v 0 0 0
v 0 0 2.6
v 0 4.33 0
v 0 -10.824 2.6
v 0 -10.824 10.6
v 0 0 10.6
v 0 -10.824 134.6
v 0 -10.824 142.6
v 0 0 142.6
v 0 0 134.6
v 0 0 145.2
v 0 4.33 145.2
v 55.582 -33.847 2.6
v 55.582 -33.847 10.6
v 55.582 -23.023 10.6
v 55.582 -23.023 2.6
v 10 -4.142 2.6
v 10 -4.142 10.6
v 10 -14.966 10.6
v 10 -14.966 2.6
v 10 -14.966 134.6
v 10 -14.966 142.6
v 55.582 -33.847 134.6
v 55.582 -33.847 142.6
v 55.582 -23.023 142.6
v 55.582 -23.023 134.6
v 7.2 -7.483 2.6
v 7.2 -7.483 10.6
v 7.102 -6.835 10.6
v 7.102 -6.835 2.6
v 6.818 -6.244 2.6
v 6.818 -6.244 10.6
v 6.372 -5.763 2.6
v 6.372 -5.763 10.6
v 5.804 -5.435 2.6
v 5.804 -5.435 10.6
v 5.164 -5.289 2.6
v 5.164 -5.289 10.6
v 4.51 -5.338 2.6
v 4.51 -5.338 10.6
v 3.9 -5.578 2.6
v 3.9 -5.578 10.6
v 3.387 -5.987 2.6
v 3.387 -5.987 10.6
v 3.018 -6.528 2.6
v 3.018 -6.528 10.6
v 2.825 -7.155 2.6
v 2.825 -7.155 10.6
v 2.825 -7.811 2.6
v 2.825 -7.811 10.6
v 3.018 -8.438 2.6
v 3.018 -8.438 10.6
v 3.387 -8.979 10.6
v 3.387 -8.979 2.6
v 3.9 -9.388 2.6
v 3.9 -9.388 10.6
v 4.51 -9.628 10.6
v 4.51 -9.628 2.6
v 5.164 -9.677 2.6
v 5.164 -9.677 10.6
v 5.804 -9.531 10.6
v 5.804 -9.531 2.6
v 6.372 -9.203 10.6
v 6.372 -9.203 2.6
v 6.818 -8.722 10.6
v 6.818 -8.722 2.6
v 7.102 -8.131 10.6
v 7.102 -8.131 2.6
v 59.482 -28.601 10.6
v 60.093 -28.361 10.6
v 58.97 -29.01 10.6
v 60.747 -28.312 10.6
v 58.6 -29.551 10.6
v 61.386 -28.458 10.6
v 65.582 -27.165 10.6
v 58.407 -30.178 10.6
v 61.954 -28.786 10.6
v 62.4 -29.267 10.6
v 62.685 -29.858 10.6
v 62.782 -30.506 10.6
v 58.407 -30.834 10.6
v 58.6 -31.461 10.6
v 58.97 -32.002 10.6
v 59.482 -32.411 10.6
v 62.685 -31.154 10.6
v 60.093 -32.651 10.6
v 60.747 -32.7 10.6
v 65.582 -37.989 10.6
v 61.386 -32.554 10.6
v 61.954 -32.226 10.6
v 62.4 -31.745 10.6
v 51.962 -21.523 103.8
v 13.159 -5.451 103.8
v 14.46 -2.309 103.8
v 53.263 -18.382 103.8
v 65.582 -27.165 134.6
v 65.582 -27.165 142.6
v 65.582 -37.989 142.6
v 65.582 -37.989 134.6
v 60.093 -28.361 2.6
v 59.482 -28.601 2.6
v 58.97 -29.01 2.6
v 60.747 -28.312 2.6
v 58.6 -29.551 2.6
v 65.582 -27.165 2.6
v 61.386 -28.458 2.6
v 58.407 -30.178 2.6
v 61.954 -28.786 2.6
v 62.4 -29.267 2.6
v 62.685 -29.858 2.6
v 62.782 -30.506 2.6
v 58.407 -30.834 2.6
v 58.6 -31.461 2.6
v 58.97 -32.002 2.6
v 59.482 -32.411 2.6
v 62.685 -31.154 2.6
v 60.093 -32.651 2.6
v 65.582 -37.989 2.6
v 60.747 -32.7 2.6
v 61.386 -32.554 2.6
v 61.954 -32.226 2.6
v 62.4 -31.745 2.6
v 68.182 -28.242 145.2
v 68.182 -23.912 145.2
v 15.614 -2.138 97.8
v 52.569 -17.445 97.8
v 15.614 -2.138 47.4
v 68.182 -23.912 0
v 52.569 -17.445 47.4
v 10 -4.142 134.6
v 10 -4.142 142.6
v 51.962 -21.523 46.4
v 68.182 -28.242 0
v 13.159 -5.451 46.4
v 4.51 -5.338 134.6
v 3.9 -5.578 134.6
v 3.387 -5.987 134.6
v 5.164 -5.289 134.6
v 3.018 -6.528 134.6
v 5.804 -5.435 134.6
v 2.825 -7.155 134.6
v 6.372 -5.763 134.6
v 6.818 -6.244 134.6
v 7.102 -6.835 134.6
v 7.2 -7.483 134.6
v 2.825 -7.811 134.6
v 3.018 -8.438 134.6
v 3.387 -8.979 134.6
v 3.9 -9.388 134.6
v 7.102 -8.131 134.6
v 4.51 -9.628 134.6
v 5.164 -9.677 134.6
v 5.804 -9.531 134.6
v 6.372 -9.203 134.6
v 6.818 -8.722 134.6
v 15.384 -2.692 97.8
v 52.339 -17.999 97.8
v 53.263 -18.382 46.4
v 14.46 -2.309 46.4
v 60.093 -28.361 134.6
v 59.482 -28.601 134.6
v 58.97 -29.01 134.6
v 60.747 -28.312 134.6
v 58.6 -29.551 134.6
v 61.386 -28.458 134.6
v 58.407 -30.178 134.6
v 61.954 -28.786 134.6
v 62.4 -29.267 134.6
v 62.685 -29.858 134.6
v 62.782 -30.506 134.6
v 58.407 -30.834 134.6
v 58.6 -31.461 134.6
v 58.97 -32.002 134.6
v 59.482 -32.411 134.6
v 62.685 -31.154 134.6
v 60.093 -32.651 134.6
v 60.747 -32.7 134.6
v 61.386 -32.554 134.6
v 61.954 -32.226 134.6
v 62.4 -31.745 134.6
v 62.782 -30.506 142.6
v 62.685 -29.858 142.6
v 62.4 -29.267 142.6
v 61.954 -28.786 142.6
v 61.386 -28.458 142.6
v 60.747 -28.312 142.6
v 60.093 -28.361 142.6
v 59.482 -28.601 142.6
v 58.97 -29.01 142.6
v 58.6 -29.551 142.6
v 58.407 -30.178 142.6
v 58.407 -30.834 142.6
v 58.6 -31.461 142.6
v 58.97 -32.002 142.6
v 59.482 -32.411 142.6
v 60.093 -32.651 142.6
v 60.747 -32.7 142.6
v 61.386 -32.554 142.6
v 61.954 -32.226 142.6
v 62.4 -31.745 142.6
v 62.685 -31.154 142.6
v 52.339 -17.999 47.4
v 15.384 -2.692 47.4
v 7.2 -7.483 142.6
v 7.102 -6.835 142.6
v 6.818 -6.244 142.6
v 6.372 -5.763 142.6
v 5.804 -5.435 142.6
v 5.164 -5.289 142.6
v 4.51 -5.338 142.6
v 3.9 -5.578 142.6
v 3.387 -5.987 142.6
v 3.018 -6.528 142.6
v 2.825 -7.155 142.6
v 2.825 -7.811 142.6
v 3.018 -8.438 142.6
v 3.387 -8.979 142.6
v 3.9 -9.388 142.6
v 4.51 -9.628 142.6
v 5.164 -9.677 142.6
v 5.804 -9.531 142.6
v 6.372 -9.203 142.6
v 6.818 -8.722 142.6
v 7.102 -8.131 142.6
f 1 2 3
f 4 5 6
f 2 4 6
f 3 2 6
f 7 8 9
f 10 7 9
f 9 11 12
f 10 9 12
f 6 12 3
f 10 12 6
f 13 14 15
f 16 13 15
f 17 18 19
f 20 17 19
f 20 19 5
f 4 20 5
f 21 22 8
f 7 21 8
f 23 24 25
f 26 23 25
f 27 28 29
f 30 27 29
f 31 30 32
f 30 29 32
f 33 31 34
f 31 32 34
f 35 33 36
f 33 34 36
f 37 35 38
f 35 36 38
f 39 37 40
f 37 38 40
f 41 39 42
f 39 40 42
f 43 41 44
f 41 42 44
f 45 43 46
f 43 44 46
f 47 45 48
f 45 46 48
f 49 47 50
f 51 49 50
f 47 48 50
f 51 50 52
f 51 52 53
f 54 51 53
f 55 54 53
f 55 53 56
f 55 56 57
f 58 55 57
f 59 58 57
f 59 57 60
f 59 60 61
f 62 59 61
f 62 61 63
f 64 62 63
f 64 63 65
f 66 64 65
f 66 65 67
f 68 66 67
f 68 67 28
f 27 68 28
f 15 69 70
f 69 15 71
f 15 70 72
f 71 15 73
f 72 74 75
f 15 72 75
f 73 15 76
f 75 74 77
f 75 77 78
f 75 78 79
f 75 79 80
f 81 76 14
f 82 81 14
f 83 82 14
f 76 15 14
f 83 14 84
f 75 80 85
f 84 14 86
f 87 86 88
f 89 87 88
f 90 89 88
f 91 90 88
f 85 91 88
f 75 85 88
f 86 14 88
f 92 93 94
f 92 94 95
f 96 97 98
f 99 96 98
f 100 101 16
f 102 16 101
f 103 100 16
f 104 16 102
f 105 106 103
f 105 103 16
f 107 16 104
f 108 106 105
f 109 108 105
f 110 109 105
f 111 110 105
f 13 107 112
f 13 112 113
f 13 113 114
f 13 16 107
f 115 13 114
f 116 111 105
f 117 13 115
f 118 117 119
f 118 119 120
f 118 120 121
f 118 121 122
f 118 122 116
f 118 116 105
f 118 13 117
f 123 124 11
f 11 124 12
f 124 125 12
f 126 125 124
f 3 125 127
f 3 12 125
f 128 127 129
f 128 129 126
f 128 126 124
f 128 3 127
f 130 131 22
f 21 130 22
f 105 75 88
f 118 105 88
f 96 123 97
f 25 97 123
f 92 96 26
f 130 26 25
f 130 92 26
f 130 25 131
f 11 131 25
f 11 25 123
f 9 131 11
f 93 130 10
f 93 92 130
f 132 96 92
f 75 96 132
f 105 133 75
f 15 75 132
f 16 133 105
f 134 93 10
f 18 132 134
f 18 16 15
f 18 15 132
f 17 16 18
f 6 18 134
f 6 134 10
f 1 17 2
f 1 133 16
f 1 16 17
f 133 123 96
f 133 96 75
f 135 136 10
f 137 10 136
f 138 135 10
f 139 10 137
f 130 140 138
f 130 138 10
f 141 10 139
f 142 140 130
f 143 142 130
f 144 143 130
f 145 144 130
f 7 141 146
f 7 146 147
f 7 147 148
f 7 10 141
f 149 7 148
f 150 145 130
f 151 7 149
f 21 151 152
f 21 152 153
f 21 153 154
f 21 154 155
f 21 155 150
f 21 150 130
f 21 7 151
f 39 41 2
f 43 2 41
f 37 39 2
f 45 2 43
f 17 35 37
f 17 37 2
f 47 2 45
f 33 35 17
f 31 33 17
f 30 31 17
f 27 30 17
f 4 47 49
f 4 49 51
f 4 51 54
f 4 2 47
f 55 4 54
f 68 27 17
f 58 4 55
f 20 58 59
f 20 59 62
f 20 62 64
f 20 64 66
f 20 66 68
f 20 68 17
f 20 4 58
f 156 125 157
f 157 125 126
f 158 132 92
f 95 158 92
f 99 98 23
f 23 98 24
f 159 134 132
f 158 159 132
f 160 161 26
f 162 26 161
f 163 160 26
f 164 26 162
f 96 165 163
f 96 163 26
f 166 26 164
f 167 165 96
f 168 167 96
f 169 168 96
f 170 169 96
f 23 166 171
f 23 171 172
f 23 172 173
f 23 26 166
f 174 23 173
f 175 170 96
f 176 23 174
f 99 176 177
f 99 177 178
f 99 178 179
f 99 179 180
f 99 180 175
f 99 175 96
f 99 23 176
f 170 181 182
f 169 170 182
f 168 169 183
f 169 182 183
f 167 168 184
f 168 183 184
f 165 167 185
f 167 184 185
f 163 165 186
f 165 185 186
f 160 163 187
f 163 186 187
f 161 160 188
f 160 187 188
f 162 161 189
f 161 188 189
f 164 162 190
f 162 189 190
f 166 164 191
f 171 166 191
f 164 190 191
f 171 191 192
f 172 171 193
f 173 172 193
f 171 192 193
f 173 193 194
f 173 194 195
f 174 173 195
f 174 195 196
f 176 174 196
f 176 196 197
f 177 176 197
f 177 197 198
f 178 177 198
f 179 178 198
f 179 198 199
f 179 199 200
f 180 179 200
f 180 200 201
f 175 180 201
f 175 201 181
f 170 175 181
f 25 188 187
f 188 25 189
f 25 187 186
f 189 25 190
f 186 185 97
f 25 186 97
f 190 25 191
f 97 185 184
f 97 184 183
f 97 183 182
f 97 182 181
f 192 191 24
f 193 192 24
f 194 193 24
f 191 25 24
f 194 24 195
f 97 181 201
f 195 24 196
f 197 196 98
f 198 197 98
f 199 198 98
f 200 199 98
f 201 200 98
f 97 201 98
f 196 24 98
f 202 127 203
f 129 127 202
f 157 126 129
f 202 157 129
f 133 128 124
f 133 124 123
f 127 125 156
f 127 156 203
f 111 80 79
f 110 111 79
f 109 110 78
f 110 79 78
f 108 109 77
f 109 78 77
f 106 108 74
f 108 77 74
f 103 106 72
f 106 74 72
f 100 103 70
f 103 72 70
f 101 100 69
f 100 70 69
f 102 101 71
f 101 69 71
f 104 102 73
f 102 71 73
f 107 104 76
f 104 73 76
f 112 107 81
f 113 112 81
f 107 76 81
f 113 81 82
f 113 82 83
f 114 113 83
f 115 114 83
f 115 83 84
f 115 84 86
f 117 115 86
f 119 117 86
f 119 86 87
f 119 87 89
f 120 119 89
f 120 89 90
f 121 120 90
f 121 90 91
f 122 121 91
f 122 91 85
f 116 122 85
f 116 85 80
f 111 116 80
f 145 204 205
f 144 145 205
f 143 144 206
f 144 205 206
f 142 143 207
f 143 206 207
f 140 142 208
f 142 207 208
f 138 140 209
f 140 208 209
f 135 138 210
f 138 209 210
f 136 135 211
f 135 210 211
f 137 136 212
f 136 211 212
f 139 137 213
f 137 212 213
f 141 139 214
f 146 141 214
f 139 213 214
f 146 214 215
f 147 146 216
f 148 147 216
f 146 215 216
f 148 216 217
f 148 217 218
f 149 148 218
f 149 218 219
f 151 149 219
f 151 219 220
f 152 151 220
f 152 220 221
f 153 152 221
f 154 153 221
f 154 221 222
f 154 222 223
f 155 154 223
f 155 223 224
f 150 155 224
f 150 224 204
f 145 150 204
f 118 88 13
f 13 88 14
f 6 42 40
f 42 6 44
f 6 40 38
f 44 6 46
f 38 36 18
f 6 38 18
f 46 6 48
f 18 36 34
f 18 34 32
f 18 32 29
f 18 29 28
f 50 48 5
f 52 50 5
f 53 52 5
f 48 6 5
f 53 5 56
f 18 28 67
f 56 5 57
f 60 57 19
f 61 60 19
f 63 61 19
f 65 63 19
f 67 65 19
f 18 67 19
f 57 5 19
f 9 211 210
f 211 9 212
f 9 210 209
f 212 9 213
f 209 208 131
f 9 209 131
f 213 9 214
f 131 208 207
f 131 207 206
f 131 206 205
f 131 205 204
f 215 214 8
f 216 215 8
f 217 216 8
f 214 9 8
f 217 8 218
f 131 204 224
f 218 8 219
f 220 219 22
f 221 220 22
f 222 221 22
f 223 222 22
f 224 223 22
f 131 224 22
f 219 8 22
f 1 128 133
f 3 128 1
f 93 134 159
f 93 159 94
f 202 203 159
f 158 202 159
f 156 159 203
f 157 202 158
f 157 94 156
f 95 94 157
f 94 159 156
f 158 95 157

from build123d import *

# Parameters (mm, degrees)
AUFSATZ_LINEAR_AUSTRAGEN1_DEPTH = 145.2
AUFSATZ_LINEAR_AUSTRAGEN2_DEPTH = 145.2
SKIZZE5_R                       = 2.2
SCHNITT_LINEAR_AUSTRAGEN1_DEPTH = 165.848511541
SCHNITT_LINEAR_AUSTRAGEN2_REACH = 166.605
SKIZZE6_W                       = 76.784770152
SKIZZE6_H                       = 124
SKIZZE6_H_2                     = 2.6
SKIZZE7_W                       = 40
SKIZZE7_H                       = 50.4
SCHNITT_LINEAR_AUSTRAGEN3_DEPTH = 166.115329215
SKIZZE8_W                       = 42
SKIZZE8_H                       = 57.4
SCHNITT_LINEAR_AUSTRAGEN4_DEPTH = 3.4


with BuildPart() as part:
    # Skizze1 → Aufsatz-Linear austragen1 (new body)
    with BuildSketch(Plane.XY):
        Polygon((0, 0), (0, 4.329568801), (68.182309499, -23.912468507), (68.182309499, -28.242037309), align=None)
    extrude(amount=AUFSATZ_LINEAR_AUSTRAGEN1_DEPTH)

    # Skizze4 → Aufsatz-Linear austragen2 (add)
    with BuildSketch(Plane.XY.offset(145.2)):
        Polygon((0, 0), (10, -4.142135624), (10, -14.966057627), (0, -10.823922003), align=None)
        Polygon((55.582309499, -23.022946423), (65.582309499, -27.165082046), (65.582309499, -37.989004049), (55.582309499, -33.846868426), align=None)
    extrude(amount=-AUFSATZ_LINEAR_AUSTRAGEN2_DEPTH)

    # Skizze5 → Schnitt-Linear austragen1 (cut, through all)
    with BuildSketch(Plane.XY.offset(145.2)):
        with Locations((5, -7.483028813)):
            Circle(SKIZZE5_R)
        with Locations((60.582309499, -30.505975236)):
            Circle(SKIZZE5_R)
    extrude(amount=-SCHNITT_LINEAR_AUSTRAGEN1_DEPTH, mode=Mode.SUBTRACT)

    # Schnitt-Linear austragen2: up to this face of the body (flat: up to its plane)
    schnitt_linear_austragen2_end = Plane(part.part.faces().sort_by_distance((32.79115475, -13.582541023, 72.6))[0])
    # Skizze6 → Schnitt-Linear austragen2 (cut, up to the picked face)
    with BuildSketch(Plane(origin=(-3.826834324, -9.238795325, 0), x_dir=(0.9238795325112881, -0.3826834323650869, 0), z_dir=(-0.3826834323650869, -0.9238795325112881, 0)), mode=Mode.PRIVATE) as schnitt_linear_austragen2_sk1:
        with Locations((36.735530827, 72.6)):
            Rectangle(SKIZZE6_W, SKIZZE6_H)
    schnitt_linear_austragen2_tool1 = split(extrude(schnitt_linear_austragen2_sk1.sketch, amount=-SCHNITT_LINEAR_AUSTRAGEN2_REACH, mode=Mode.PRIVATE), bisect_by=schnitt_linear_austragen2_end, keep=Keep.BOTH, mode=Mode.PRIVATE)
    # Skizze6 → Schnitt-Linear austragen2 (cut, up to the picked face)
    with BuildSketch(Plane(origin=(-3.826834324, -9.238795325, 0), x_dir=(0.9238795325112881, -0.3826834323650869, 0), z_dir=(-0.3826834323650869, -0.9238795325112881, 0)), mode=Mode.PRIVATE) as schnitt_linear_austragen2_sk2:
        with Locations((36.735530827, 143.9)):
            Rectangle(SKIZZE6_W, SKIZZE6_H_2)
    schnitt_linear_austragen2_tool2 = split(extrude(schnitt_linear_austragen2_sk2.sketch, amount=-SCHNITT_LINEAR_AUSTRAGEN2_REACH, mode=Mode.PRIVATE), bisect_by=schnitt_linear_austragen2_end, keep=Keep.BOTH, mode=Mode.PRIVATE)
    # Skizze6 → Schnitt-Linear austragen2 (cut, up to the picked face)
    with BuildSketch(Plane(origin=(-3.826834324, -9.238795325, 0), x_dir=(0.9238795325112881, -0.3826834323650869, 0), z_dir=(-0.3826834323650869, -0.9238795325112881, 0)), mode=Mode.PRIVATE) as schnitt_linear_austragen2_sk3:
        with Locations((36.735530827, 1.3)):
            Rectangle(SKIZZE6_W, SKIZZE6_H_2)
    schnitt_linear_austragen2_tool3 = split(extrude(schnitt_linear_austragen2_sk3.sketch, amount=-SCHNITT_LINEAR_AUSTRAGEN2_REACH, mode=Mode.PRIVATE), bisect_by=schnitt_linear_austragen2_end, keep=Keep.BOTH, mode=Mode.PRIVATE)
    add(schnitt_linear_austragen2_tool1.solids().sort_by(Axis((30.112371, -23.296874, 72.6), (0.3826834323650869, 0.9238795325112881, 0)))[0], mode=Mode.SUBTRACT)
    add(schnitt_linear_austragen2_tool2.solids().sort_by(Axis((30.112371, -23.296874, 143.9), (0.3826834323650869, 0.9238795325112881, 0)))[0], mode=Mode.SUBTRACT)
    add(schnitt_linear_austragen2_tool3.solids().sort_by(Axis((30.112371, -23.296874, 1.3), (0.3826834323650869, 0.9238795325112881, 0)))[0], mode=Mode.SUBTRACT)

    # Skizze7 → Schnitt-Linear austragen3 (cut, through all)
    with BuildSketch(Plane(origin=(1.530733729, 3.69551813, 0), x_dir=(0.9238795325112881, -0.38268343236508656, 0), z_dir=(0.38268343236508656, 0.9238795325112881, 0))):
        with Locations((35.243145751, -72.6)):
            Rectangle(SKIZZE7_W, SKIZZE7_H)
    extrude(amount=-SCHNITT_LINEAR_AUSTRAGEN3_DEPTH, mode=Mode.SUBTRACT)

    # Skizze8 → Schnitt-Linear austragen4 (cut)
    with BuildSketch(Plane(origin=(0, 0, 0), x_dir=(0.923879532511288, -0.38268343236508684, 0), z_dir=(-0.38268343236508684, -0.923879532511288, 0))):
        with Locations((35.243145751, 75.1)):
            Rectangle(SKIZZE8_W, SKIZZE8_H)
    extrude(amount=-SCHNITT_LINEAR_AUSTRAGEN4_DEPTH, mode=Mode.SUBTRACT)


solid = part.part
